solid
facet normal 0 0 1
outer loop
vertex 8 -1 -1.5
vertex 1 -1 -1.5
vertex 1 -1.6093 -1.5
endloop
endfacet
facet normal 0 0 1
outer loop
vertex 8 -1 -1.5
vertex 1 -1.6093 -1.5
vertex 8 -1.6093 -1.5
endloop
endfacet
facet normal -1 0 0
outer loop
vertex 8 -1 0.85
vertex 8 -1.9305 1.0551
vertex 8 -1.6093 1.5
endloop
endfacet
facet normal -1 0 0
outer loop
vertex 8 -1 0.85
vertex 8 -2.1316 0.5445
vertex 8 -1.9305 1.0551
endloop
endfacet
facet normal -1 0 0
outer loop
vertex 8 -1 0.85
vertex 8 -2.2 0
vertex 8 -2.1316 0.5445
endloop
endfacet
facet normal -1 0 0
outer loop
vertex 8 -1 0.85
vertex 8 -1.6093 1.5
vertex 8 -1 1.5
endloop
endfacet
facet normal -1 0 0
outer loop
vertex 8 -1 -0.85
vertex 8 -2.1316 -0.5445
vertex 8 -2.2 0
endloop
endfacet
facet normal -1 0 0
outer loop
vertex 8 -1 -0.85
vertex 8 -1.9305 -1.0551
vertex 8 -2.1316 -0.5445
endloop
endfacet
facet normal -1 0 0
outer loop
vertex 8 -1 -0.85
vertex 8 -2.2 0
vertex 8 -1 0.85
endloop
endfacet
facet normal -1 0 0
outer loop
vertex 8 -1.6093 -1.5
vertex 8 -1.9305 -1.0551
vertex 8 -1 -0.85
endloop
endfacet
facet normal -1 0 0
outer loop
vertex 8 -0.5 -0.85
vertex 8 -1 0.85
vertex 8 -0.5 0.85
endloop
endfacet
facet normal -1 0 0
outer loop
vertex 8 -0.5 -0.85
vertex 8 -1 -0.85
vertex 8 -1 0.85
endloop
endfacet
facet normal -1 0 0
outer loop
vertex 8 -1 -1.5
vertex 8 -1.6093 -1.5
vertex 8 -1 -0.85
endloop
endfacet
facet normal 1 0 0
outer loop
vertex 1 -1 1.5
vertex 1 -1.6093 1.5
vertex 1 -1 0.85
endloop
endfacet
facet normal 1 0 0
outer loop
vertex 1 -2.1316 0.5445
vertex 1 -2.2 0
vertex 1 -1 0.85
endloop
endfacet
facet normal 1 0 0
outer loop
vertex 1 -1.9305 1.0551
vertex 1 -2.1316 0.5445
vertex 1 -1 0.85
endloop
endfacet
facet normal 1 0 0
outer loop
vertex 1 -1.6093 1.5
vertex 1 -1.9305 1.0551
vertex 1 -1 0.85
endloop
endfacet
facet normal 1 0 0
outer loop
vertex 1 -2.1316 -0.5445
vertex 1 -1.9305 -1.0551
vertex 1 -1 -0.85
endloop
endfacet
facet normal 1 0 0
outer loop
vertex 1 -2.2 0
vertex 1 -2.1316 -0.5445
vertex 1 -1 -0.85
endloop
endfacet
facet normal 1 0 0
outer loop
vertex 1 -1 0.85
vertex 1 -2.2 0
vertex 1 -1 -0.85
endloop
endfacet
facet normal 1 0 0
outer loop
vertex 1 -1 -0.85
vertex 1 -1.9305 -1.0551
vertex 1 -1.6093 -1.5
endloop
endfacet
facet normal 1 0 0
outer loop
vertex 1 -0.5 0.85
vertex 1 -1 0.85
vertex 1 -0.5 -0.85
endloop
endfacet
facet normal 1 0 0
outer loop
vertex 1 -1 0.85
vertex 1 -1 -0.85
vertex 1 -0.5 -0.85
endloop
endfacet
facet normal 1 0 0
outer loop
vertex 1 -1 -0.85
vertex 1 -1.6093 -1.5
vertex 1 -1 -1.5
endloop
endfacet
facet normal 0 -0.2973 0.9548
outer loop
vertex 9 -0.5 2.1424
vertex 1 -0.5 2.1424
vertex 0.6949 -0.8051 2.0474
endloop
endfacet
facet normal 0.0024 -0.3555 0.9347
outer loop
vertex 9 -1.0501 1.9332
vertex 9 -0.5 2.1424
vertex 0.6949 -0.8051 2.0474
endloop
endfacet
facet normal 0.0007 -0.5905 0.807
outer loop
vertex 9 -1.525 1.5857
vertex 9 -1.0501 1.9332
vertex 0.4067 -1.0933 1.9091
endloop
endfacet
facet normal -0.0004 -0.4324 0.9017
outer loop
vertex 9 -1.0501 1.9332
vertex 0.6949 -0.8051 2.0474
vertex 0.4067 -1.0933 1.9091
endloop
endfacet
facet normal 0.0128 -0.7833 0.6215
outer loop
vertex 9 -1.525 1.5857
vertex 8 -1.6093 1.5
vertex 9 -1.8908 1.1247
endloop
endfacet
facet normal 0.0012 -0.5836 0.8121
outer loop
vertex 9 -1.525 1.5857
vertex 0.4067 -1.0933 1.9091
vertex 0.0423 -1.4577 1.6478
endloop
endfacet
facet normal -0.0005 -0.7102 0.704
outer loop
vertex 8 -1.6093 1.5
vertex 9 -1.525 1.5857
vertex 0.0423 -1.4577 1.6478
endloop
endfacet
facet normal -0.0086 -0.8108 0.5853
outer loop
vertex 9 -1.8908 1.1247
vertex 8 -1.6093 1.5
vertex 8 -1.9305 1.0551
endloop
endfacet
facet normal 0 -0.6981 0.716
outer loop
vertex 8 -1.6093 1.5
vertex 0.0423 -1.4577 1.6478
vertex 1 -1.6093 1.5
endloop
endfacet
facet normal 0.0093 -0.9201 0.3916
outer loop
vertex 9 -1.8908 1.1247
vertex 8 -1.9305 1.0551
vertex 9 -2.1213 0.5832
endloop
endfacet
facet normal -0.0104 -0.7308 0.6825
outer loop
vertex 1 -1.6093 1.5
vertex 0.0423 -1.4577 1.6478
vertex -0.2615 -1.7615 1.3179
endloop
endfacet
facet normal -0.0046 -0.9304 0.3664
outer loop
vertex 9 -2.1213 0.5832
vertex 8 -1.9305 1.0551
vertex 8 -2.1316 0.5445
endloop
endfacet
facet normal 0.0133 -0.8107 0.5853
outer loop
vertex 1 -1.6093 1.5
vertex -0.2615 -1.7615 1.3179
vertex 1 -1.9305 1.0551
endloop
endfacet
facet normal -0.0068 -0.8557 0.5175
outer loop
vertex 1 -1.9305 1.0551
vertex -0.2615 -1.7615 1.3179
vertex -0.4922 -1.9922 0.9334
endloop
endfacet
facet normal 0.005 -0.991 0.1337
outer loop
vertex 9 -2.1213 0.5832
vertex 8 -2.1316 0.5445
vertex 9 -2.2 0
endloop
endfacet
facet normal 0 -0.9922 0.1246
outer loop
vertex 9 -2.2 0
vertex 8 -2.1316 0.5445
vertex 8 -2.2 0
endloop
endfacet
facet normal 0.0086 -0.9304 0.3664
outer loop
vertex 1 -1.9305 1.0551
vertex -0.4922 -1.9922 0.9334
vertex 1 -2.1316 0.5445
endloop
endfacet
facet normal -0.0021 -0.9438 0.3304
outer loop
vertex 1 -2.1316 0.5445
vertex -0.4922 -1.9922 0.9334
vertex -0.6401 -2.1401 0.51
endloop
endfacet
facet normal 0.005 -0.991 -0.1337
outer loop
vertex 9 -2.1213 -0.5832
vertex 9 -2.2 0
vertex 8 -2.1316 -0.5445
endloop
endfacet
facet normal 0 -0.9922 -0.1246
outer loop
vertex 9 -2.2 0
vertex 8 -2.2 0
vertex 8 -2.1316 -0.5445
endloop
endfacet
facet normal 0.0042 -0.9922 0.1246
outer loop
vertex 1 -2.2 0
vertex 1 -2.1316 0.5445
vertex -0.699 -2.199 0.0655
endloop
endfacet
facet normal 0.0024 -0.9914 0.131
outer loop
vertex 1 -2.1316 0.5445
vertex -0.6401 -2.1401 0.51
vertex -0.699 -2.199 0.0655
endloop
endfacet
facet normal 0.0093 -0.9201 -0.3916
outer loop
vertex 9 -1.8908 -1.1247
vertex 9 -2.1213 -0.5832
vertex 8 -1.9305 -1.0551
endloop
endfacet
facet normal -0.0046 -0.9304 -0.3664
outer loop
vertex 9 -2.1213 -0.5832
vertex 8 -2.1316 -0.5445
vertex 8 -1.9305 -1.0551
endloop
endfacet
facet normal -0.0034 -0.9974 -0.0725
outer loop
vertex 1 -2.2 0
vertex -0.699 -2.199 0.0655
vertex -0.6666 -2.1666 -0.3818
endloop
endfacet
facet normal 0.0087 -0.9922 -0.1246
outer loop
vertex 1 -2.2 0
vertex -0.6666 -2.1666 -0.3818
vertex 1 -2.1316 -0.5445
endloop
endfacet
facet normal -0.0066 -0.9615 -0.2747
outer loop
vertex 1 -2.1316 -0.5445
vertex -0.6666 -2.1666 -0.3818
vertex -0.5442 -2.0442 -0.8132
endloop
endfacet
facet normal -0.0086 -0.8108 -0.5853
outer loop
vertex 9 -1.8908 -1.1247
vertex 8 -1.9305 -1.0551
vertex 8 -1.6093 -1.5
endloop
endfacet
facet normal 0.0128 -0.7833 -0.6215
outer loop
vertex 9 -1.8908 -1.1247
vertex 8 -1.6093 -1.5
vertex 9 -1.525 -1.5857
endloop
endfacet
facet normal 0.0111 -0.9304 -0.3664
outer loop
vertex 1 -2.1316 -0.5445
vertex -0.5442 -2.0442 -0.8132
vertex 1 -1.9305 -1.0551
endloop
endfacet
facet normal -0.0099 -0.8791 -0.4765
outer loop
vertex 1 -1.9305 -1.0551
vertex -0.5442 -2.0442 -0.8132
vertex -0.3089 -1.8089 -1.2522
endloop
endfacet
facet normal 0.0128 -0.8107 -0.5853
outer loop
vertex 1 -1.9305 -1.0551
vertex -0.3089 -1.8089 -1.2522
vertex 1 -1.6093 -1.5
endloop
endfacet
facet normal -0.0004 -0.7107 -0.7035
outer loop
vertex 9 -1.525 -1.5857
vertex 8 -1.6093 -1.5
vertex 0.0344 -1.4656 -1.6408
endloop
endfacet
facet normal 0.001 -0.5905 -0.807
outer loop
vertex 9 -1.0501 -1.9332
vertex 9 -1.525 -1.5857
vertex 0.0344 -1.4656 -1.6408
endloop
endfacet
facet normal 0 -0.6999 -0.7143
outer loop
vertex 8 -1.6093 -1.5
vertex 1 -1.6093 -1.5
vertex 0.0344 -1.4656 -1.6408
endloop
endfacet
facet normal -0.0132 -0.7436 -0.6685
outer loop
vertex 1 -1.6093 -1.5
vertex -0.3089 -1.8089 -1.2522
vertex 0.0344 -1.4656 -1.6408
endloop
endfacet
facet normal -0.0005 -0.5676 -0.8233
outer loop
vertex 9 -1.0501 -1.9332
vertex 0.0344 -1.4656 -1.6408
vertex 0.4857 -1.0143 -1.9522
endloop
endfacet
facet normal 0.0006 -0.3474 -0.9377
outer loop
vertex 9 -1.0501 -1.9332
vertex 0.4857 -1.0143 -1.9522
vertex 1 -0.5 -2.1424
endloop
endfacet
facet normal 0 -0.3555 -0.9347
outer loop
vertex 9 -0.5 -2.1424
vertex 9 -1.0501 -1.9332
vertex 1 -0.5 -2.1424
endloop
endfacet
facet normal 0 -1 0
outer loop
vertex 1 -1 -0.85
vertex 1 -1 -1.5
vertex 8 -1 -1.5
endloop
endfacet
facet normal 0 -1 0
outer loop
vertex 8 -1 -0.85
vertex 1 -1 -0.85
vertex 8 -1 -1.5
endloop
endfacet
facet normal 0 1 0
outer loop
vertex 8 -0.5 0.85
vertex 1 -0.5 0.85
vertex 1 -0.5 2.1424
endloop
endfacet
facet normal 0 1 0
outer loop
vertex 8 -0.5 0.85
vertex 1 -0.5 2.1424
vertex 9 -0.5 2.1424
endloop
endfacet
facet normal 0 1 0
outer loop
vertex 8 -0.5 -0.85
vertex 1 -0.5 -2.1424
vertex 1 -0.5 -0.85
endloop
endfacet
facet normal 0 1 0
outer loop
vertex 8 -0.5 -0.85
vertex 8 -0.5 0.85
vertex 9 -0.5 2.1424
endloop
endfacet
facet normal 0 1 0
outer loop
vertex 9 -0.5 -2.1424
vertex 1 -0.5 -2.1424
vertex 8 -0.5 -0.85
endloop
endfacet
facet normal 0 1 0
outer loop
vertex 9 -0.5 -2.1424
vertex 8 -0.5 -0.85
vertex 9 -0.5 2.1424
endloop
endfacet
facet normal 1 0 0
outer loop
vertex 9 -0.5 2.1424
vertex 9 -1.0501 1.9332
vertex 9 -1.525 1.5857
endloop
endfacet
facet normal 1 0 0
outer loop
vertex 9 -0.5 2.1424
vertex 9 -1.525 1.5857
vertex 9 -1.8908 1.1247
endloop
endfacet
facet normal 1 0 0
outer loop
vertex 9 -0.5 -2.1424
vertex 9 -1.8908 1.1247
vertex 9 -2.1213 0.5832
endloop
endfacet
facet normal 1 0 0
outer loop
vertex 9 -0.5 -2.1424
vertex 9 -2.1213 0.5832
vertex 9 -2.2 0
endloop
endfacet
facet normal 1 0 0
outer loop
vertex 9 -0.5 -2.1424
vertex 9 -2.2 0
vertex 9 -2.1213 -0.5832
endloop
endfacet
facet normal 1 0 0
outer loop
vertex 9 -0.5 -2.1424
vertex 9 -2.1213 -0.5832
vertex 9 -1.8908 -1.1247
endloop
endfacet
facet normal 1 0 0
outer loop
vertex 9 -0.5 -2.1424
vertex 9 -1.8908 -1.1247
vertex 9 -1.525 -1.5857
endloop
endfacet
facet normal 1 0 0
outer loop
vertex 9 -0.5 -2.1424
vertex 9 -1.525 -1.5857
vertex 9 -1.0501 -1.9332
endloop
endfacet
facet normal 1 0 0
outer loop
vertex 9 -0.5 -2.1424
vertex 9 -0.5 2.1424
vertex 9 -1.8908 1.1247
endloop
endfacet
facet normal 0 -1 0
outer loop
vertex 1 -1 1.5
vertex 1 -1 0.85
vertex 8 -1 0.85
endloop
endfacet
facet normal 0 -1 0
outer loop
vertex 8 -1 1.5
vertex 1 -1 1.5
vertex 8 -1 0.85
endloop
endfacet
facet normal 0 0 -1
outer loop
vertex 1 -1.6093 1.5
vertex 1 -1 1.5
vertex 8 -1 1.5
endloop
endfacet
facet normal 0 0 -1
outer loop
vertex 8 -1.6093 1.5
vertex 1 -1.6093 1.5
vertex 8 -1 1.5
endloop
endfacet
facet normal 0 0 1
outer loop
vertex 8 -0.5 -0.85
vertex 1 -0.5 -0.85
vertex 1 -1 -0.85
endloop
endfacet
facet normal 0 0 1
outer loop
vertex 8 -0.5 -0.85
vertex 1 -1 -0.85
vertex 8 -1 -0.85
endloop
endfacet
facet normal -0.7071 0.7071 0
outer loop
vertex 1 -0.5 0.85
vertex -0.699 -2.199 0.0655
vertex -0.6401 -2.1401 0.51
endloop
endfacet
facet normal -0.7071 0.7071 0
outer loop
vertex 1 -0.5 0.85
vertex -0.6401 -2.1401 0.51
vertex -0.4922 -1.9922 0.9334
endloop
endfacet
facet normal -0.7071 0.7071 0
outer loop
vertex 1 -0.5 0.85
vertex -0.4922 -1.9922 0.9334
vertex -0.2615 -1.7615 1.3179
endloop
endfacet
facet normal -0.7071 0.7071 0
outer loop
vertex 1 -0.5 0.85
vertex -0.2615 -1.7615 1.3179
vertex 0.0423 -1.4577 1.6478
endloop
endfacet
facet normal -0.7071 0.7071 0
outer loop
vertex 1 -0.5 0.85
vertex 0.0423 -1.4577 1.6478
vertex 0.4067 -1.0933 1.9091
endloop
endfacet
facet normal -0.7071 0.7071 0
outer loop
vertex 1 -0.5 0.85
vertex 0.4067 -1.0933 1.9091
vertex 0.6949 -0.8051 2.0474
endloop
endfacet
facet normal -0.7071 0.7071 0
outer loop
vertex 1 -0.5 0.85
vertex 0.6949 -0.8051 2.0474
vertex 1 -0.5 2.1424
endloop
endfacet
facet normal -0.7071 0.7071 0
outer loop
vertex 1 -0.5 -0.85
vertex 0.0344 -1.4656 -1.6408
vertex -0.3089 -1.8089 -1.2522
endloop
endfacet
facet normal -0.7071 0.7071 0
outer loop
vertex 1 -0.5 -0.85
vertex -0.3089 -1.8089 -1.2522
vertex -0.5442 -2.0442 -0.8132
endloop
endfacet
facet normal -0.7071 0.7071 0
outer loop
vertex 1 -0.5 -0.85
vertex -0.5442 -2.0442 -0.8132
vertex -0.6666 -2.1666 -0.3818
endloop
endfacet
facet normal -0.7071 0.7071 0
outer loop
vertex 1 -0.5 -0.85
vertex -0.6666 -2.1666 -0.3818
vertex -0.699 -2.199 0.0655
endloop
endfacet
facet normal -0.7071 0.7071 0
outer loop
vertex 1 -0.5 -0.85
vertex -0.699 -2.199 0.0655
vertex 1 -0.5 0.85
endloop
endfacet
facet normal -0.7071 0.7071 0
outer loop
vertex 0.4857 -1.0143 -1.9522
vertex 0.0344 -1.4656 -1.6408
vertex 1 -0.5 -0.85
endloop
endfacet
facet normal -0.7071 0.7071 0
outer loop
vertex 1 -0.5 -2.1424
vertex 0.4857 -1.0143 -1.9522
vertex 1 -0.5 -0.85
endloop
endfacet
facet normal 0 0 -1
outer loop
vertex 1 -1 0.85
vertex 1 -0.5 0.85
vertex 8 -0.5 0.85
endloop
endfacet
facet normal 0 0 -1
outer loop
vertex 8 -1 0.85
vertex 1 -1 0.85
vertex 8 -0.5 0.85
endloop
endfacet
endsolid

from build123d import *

# Parameters (mm, degrees)
BOX003_W               = 14
BOX003_H               = 10
BOX003_DEPTH           = 10
BOX003_PLACEMENT_ANGLE = 45
BOX002_W               = 7
BOX002_H               = 1.6
BOX002_DEPTH           = 3
BOX001_W               = 7
BOX001_H               = 5
BOX001_DEPTH           = 1.7
BOX_W                  = 14
BOX_H                  = 7
BOX_DEPTH              = 10
CYLINDER_R             = 2.2
CYLINDER_DEPTH         = 13


with BuildPart() as w_rfel003:
    # Box003 → Box003 (new body)
    with BuildSketch(Plane.XY):
        with Locations((7, 5)):
            Rectangle(BOX003_W, BOX003_H)
    extrude(amount=BOX003_DEPTH)


with BuildPart() as w_rfel003_1:
    # Box003 placement: moved
    add(w_rfel003.part.moved(Location((-4.7, -6.2, -3))).rotate(Axis((-4.7, -6.2, -3), (0, 0, 1)), BOX003_PLACEMENT_ANGLE))


with BuildPart() as w_rfel002:
    # Box002 → Box002 (new body)
    with BuildSketch(Plane(origin=(1, -2.6, -1.5), x_dir=(1, 0, 0), z_dir=(0, 0, 1))):
        with Locations((3.5, 0.8)):
            Rectangle(BOX002_W, BOX002_H)
    extrude(amount=BOX002_DEPTH)


with BuildPart() as w_rfel001:
    # Box001 → Box001 (new body)
    with BuildSketch(Plane(origin=(1, -4, -0.85), x_dir=(1, 0, 0), z_dir=(0, 0, 1))):
        with Locations((3.5, 2.5)):
            Rectangle(BOX001_W, BOX001_H)
    extrude(amount=BOX001_DEPTH)


with BuildPart() as w_rfel:
    # Box → Box (new body)
    with BuildSketch(Plane(origin=(-4, -0.5, -4), x_dir=(1, 0, 0), z_dir=(0, 0, 1))):
        with Locations((7, 3.5)):
            Rectangle(BOX_W, BOX_H)
    extrude(amount=BOX_DEPTH)


with BuildPart() as body:
    # Sketch → Revolution (revolve)
    with BuildSketch(Plane.XY):
        with BuildLine():
            add(Edge.make_bspline(
                [(1.699821, 2.2), (2.24, 1.1), (2.24, 0)],
                knots=[-2.2, -2.2, -2.2, 0, 0, 0], degree=2))
            Line((2.24, 0), (1.699821, 0))
            Line((1.699821, 0), (1.699821, 2.2))
        make_face()
    revolve(axis=Axis((0, 0, 0), (1, 0, 0)))


with BuildPart() as body_1:
    # Body placement: moved
    add(body.part.moved(Location((-1.7, 20, 0))))


with BuildPart() as cut004:
    # Cylinder → Cylinder (new body)
    with BuildSketch(Plane(origin=(-4, 0, 0), x_dir=(0, 0, -1), z_dir=(1, 0, 0))):
        Circle(CYLINDER_R)
    extrude(amount=CYLINDER_DEPTH)

    # Cut: cut Body
    add(body_1.part, mode=Mode.SUBTRACT)

    # Cut001: cut Würfel
    add(w_rfel.part, mode=Mode.SUBTRACT)

    # Cut002: cut Würfel001
    add(w_rfel001.part, mode=Mode.SUBTRACT)

    # Cut003: cut Würfel002
    add(w_rfel002.part, mode=Mode.SUBTRACT)

    # Cut004: cut Würfel003
    add(w_rfel003_1.part, mode=Mode.SUBTRACT)


solid = cut004.part
